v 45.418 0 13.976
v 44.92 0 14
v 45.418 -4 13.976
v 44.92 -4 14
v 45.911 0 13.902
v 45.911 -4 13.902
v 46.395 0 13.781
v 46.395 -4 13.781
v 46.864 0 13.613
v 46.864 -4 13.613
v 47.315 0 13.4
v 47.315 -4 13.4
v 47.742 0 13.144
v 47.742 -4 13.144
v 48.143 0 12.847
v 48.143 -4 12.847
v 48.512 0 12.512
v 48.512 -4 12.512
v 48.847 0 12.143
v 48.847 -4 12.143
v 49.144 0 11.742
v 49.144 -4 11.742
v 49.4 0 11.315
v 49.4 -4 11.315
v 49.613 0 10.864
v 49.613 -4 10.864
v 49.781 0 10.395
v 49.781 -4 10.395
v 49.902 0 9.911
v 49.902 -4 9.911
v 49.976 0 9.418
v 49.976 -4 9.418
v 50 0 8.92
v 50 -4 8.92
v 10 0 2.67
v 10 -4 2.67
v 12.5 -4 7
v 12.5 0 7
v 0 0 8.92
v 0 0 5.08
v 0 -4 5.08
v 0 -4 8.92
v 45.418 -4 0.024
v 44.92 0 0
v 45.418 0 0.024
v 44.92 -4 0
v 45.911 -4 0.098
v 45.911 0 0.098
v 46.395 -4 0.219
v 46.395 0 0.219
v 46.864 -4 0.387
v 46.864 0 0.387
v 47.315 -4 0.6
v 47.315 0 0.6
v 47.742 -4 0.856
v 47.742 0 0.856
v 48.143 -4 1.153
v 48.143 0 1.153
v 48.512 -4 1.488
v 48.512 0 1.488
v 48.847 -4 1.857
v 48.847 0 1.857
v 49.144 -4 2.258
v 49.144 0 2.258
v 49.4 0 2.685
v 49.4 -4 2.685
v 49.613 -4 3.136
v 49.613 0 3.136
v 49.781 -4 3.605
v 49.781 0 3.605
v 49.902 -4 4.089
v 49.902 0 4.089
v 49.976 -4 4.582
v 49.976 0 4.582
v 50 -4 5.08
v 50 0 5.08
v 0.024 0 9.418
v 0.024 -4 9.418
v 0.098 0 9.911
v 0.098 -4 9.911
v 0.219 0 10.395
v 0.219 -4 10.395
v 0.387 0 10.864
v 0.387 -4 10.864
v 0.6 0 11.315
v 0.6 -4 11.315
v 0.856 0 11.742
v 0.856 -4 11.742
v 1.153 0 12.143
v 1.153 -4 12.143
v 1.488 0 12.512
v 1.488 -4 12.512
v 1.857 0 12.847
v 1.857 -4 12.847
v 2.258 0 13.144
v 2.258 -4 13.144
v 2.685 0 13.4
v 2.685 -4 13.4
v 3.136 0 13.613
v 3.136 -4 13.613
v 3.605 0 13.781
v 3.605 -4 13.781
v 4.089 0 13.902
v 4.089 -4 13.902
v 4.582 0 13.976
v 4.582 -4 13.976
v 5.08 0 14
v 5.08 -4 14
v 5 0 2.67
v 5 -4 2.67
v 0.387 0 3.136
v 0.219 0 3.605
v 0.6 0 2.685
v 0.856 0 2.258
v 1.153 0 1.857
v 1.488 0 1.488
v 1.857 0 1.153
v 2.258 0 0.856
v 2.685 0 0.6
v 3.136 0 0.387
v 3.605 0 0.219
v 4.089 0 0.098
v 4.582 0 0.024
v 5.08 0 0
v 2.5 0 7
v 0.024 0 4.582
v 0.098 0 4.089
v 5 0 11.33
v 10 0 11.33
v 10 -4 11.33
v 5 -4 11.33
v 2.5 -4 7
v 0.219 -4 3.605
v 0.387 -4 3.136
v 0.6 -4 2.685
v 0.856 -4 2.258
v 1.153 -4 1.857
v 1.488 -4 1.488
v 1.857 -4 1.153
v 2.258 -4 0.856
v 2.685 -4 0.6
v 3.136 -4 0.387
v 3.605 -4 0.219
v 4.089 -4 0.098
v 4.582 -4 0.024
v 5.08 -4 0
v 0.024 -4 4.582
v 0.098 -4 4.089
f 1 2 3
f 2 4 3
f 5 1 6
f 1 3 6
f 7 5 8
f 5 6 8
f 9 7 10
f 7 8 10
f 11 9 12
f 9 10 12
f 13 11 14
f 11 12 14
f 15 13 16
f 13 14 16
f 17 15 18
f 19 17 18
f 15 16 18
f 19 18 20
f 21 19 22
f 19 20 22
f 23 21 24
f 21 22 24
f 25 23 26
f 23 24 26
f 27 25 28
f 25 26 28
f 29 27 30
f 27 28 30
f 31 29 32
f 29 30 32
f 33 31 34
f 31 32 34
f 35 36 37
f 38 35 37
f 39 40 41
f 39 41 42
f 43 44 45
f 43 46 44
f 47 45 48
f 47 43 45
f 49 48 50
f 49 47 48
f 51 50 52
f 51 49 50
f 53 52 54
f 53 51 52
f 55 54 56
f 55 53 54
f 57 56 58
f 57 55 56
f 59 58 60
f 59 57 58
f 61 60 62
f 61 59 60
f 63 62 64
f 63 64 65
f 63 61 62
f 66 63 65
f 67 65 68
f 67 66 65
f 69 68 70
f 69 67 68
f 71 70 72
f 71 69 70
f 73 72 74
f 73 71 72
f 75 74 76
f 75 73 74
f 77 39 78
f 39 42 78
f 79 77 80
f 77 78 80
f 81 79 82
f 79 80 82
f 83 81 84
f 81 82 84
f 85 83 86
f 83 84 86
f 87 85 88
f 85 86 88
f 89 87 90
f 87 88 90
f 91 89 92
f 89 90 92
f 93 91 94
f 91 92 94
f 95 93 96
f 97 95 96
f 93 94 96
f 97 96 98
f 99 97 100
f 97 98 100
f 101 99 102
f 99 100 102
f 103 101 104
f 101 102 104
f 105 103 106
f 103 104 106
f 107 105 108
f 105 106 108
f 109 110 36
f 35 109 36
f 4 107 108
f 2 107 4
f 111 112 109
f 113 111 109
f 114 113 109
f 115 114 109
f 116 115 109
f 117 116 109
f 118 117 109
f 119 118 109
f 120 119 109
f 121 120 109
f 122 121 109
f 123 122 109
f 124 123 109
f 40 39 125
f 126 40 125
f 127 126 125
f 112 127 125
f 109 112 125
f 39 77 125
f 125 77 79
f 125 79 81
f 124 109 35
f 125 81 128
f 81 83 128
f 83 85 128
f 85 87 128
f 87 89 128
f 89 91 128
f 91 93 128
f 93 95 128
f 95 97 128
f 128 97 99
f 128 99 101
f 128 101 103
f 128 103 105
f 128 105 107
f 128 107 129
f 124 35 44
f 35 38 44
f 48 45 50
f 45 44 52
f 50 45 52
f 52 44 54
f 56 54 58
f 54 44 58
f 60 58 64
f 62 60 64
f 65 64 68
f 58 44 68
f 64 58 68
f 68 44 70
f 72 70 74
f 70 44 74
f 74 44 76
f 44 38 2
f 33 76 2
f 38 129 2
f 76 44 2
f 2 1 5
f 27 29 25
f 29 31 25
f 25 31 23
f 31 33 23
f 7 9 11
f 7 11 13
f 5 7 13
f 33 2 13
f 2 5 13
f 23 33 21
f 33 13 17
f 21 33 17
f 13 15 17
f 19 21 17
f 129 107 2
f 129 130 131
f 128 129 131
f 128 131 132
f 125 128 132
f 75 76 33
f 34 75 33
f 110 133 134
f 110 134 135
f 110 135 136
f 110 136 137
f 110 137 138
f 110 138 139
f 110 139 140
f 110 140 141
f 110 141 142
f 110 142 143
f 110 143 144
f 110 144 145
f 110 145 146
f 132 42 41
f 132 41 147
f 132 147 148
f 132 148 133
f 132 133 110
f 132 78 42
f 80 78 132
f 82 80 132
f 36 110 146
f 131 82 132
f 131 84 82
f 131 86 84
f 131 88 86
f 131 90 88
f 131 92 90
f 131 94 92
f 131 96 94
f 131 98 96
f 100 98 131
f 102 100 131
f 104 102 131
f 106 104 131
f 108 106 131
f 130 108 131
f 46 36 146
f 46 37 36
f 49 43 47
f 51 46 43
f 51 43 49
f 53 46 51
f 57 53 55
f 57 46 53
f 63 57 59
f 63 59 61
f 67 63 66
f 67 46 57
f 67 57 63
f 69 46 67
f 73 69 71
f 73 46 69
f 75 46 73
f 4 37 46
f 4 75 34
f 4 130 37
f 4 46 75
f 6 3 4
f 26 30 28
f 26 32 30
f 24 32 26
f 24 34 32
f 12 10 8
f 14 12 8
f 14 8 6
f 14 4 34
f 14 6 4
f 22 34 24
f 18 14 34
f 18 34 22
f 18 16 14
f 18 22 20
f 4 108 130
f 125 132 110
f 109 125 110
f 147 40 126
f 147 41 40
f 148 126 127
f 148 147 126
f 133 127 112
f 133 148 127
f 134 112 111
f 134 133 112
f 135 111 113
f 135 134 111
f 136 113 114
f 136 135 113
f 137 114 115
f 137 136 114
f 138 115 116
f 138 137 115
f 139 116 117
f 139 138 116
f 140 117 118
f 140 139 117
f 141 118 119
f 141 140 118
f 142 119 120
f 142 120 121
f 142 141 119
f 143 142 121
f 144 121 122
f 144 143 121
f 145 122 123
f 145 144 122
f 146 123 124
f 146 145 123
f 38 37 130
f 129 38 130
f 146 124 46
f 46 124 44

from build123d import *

# Parameters (mm, degrees)
F0_W     = 50
F0_H     = 14
F1_DEPTH = 4
F3_DEPTH = 4.001
F4_R     = 5.08


with BuildPart() as f1:
    # F0 (on Front) → F1 (new body)
    with BuildSketch(Plane.XZ):
        with Locations((25, 7)):
            Rectangle(F0_W, F0_H)
    extrude(amount=F1_DEPTH)

    # F2 (on face) → F3 (cut, through all)
    with BuildSketch(Plane.XZ.offset(4)):
        Polygon((12.5, 7), (10, 11.330127), (5, 11.330127), (2.5, 7), (5, 2.669873), (10, 2.669873), align=None)
    extrude(amount=-F3_DEPTH, mode=Mode.SUBTRACT)

    # F4
    f4_edges = [f1.edges().sort_by_distance(p)[0] for p in [
        (0, -2, 14),
        (50, -2, 14),
        (50, -2, 0),
        (0, -2, 0),
    ]]
    fillet(f4_edges, radius=F4_R)


solid = f1.part
